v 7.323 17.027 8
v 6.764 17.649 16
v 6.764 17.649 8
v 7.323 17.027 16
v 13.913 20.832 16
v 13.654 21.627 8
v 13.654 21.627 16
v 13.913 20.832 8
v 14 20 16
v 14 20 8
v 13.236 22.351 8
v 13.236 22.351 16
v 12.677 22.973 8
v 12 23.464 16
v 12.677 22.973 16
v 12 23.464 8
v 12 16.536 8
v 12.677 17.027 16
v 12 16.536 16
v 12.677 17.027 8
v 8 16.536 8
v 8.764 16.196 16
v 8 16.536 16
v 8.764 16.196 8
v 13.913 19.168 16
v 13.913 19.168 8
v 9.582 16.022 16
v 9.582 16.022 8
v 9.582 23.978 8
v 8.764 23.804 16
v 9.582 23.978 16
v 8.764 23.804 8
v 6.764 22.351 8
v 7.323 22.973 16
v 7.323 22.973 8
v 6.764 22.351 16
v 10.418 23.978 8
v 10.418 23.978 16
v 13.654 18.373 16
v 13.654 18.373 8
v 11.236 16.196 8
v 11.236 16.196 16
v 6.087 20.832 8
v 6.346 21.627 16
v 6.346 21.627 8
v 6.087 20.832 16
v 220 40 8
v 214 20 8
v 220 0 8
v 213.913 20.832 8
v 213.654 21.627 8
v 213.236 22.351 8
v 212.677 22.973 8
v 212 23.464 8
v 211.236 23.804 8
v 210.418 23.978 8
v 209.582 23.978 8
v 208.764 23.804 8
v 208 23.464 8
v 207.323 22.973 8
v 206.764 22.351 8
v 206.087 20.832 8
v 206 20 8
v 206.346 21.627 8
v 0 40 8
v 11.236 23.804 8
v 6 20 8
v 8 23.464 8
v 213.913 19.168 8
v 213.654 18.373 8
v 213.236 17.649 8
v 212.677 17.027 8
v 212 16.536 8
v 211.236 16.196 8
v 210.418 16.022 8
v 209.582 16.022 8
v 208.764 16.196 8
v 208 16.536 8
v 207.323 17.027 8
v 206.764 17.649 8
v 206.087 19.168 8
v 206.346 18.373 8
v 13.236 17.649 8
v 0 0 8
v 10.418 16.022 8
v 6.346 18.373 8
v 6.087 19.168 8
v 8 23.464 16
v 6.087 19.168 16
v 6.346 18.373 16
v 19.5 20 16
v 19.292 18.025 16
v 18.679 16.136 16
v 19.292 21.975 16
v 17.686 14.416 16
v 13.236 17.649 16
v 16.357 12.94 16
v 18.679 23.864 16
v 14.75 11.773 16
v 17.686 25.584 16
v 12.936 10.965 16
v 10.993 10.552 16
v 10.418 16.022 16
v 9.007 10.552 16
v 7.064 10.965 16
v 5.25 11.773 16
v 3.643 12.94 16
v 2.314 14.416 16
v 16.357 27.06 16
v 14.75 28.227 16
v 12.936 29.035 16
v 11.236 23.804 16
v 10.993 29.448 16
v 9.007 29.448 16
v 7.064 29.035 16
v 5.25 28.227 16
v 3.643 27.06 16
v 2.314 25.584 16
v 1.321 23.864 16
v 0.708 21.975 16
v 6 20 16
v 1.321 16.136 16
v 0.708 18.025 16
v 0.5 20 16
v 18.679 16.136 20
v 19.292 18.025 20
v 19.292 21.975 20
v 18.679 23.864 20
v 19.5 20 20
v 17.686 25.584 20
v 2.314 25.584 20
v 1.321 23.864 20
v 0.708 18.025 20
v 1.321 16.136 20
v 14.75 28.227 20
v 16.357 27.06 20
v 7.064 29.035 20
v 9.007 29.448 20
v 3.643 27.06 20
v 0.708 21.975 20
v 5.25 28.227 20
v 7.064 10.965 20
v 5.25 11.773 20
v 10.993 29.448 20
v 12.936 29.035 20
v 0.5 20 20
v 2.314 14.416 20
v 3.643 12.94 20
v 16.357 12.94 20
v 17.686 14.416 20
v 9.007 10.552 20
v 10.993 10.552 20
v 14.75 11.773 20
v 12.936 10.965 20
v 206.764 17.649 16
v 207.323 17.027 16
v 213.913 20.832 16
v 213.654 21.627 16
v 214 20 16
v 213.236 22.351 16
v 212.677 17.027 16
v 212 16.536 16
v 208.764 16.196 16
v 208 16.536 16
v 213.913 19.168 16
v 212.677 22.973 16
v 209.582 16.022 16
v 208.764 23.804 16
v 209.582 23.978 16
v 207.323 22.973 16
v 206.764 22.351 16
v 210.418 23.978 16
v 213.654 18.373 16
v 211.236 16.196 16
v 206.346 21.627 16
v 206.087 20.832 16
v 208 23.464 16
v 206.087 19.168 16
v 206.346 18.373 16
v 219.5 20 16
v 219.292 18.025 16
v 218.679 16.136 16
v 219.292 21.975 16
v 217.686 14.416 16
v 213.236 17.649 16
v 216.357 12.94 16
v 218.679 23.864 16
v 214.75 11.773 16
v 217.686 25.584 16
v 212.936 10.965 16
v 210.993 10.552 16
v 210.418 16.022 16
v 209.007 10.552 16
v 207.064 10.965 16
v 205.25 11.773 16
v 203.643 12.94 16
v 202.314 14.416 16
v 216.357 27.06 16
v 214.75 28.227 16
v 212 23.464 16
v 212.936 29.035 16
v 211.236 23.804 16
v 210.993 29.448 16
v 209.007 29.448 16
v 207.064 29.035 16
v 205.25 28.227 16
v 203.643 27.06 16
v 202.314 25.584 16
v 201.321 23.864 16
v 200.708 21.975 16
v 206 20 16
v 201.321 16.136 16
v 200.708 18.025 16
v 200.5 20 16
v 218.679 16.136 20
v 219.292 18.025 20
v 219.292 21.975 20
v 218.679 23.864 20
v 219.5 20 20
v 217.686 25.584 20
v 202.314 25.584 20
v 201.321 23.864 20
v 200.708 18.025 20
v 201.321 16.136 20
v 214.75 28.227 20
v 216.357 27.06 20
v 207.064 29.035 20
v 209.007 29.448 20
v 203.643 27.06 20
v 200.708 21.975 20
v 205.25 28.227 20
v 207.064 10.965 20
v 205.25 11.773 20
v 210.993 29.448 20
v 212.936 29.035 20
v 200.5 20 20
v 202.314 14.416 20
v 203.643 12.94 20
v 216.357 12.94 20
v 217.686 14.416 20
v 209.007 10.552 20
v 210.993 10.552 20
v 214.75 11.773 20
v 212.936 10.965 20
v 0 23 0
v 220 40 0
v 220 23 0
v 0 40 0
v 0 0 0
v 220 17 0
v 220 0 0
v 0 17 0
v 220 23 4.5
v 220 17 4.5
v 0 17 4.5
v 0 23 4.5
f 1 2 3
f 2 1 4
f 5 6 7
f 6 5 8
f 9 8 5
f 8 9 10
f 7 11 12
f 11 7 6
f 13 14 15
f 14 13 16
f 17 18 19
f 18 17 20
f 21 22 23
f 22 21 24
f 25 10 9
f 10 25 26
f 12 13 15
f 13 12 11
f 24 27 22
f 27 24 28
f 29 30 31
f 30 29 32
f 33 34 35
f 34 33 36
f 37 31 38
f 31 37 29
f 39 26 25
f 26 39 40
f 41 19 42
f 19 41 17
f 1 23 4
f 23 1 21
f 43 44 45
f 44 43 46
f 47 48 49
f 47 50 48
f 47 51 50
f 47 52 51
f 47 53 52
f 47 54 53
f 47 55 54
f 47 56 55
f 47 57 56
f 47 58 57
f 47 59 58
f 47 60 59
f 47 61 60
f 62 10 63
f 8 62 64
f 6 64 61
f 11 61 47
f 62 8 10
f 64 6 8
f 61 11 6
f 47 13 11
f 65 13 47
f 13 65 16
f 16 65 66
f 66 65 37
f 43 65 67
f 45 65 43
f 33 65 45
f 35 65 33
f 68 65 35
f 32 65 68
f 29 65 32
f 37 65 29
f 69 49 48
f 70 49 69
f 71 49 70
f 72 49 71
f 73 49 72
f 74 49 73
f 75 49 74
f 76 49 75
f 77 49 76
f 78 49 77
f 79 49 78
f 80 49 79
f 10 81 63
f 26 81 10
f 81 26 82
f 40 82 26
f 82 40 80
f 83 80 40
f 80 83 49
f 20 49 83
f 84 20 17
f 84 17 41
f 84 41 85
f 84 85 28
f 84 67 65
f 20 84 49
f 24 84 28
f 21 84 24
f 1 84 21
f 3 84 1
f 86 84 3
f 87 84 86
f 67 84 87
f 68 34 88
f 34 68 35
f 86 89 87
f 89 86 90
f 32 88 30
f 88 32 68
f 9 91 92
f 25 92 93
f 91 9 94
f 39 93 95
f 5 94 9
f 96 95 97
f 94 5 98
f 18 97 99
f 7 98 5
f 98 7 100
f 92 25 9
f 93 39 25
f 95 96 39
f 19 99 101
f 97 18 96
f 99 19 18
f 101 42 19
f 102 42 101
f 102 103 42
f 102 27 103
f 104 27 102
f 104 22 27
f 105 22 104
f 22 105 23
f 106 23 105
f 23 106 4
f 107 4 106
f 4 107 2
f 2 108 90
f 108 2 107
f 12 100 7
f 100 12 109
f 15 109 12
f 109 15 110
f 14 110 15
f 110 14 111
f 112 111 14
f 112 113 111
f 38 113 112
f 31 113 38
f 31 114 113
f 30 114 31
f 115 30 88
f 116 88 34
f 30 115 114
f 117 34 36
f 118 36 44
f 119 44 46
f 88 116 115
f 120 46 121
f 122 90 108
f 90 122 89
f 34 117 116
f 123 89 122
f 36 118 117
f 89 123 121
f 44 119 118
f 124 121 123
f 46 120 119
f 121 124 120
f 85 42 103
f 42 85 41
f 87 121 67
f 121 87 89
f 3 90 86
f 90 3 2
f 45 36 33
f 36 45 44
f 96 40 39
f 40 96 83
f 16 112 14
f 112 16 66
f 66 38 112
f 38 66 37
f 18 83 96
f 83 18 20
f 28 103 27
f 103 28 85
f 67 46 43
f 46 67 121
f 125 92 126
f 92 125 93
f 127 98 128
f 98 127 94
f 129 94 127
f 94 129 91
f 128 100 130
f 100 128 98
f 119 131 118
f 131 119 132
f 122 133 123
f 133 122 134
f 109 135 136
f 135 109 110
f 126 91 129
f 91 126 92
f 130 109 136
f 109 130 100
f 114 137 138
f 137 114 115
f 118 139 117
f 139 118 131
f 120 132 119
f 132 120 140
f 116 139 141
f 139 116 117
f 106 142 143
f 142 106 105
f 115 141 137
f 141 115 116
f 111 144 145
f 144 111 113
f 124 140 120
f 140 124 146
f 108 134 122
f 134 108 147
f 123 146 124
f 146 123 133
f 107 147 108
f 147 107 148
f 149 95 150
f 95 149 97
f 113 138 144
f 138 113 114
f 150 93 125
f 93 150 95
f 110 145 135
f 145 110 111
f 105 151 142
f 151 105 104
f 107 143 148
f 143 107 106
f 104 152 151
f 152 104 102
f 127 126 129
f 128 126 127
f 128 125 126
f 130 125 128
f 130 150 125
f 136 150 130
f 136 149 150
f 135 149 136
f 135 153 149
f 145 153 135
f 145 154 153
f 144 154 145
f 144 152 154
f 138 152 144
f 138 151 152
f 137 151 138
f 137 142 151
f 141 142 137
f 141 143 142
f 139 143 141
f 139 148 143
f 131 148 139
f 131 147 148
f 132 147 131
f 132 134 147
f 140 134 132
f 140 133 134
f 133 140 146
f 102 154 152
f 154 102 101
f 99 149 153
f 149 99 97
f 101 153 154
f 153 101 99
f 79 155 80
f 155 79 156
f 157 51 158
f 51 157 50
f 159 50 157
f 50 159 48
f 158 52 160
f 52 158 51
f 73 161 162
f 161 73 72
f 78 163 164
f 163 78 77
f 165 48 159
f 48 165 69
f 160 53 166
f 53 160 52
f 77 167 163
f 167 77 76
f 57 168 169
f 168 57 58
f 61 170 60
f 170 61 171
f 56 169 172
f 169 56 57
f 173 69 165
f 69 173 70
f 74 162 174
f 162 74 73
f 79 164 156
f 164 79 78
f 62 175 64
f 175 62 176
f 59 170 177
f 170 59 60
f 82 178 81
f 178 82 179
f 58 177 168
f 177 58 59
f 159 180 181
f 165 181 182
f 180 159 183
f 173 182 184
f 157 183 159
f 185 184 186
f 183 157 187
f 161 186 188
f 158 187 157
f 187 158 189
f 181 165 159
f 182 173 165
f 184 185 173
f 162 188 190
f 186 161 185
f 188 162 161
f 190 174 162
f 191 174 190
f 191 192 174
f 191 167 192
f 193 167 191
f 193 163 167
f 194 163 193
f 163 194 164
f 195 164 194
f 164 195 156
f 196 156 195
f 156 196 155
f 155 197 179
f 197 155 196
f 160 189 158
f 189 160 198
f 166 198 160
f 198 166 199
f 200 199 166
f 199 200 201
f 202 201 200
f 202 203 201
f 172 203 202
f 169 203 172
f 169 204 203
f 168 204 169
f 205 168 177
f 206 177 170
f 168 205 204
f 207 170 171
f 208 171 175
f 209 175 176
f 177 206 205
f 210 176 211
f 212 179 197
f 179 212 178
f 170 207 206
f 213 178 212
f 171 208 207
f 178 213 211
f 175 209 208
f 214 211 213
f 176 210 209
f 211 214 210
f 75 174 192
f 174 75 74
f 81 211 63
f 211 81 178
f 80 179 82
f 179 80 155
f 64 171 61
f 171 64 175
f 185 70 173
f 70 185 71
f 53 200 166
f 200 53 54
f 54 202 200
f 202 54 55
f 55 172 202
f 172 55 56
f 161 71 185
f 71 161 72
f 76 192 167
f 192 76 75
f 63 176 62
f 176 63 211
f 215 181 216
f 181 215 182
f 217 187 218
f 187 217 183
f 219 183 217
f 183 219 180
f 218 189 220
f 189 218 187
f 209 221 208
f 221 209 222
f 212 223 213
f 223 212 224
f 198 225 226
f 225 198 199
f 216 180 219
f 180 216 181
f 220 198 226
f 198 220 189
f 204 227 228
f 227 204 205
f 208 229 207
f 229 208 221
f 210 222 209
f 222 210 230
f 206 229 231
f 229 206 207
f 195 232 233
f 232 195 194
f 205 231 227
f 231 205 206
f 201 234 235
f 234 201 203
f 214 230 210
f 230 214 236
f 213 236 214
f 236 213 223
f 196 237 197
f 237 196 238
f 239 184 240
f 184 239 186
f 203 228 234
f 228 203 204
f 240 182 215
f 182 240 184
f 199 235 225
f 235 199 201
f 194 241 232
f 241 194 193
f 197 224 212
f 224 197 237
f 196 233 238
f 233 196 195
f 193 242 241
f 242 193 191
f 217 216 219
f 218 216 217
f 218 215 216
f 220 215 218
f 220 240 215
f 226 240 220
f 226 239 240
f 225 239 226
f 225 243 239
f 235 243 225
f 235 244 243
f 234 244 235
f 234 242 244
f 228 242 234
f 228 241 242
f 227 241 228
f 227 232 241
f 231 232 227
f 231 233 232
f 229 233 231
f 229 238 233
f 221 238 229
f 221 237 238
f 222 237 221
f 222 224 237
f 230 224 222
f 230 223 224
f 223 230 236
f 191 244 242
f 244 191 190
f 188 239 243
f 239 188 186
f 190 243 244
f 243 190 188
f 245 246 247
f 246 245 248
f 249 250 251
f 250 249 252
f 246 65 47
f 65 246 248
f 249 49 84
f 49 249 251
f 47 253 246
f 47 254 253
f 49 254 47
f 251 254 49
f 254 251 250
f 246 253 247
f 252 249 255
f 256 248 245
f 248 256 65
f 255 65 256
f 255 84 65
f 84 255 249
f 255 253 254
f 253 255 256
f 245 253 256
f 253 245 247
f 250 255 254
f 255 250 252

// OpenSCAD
// file: parameters.scad
// Shared parameters for epdiy case design
// Single source of truth for all dimensions and design parameters

// E-ink screen dimensions (non-active part)
eink_width = 216;
eink_height = 156;
eink_thickness = 2; // Assumed thickness

// Active part dimensions
active_offset_x = 12;
active_offset_y = 12;
active_width = 202.8;
active_height = 139.4;

// Thicker ribbon dimensions
thick_ribbon_width = 182;
thick_ribbon_height = 20;
thick_ribbon_offset_x = 20; // from left of non-active part

// PCB connection ribbon dimensions  
pcb_ribbon_width = 17;
pcb_ribbon_height = 20;
pcb_ribbon_offset_x = 20; // from left of thicker ribbon

// PCB dimensions
pcb_width = 97;
pcb_height = 55;
pcb_thickness = 1.6; // Standard PCB thickness

// Mounting hole positions (relative to PCB origin)
mounting_holes = [
    [27.5, 12],
    [122.5, 12], 
    [27.5, 62],
    [122.5, 62]
];

// Design parameters for e-ink holder
arm_thickness = 6;
arm_length = 10;
groove_depth = 2;
groove_width = eink_thickness + 0.5; // Screen thickness + clearance
wall_height = 1.5;
bottom_arm_thickness = 4;

// Calculate case dimensions to accommodate screen size
case_width = eink_width + 2 * arm_thickness;  // 217 + 12 = 229mm
case_height = eink_height + bottom_arm_thickness; // 156 + 4 = 160mm

// Back structure parameters for e-ink holder
back_thickness = 2;
center_size = 60;
tendril_width = 10;

// PCB holder parameters
screw_hole_diameter = 2.4; // M2 screws (2mm + clearance)
screw_head_diameter = 4;   // M2 round head diameter  
screw_head_height = 1.4;   // M2 round head height (above surface)
standoff_height = 5;

// M2 nut parameters  
nut_diameter = 4.4;  // M2 hex nut width across flats (4mm + tolerance)
nut_thickness = 1.6; // M2 nut thickness

// Temporary assembly option (while waiting for screws)
use_temporary_pins = false;  // Set to false for screw holes, true for temporary pins
pin_diameter = 2.0;         // Pin diameter (fits through 2.2mm PCB holes)  
pin_height = 3;             // Pin height above standoff

// Calculate PCB holder dimensions to encompass all mounting holes
min_hole_x = min([for (hole = mounting_holes) hole[0]]) - 10;
max_hole_x = max([for (hole = mounting_holes) hole[0]]) + 10;
min_hole_y = min([for (hole = mounting_holes) hole[1]]) - 10;
max_hole_y = max([for (hole = mounting_holes) hole[1]]) + 10;

pcb_holder_width = max_hole_x - min_hole_x;
pcb_holder_height = max_hole_y - min_hole_y;

// Complete case parameters
case_thickness = 8; // Total thickness for back-to-back mounting
// main file
// Bridge Connector - spans between two complete cases bottom arms
// Provides pin-holders on top for mounting additional cases above
// Creates stackable/modular grid system

// Import parameters for consistency
include <parameters.scad>

// Bridge dimensions - spans between two cases
case_to_case_spacing = 240;  // 6 × 4cm spacing between case centers
bridge_length = 220;  // Long enough for 200mm pin spacing + clearance
bridge_width = 40;   // Reduced width to save material
bridge_thickness = 8; // Thickness for structural strength

// Bottom arm connection parameters (arms extend horizontally)
bottom_arm_slot_length = 62;   // Length to accommodate horizontal bottom arm
bottom_arm_slot_width = 6;     // Width of horizontal arm + clearance
bottom_arm_slot_depth = 4.5;   // Depth of groove to sit on horizontal arm (4mm + 0.5mm clearance)

// Pin-holder parameters (to match IKEA pin dimensions)
pin_head_diameter = 19;
pin_shaft_diameter = 8;
pin_total_height = 12;   // Total height of pin-holder
pin_shaft_height = 8;    // Height of shaft portion
pin_head_height = 4;     // Height of head portion

// Pin-holder positioning (must match complete case keyhole spacing)
pin_spacing = 200;  // 5 × 4cm spacing to match complete case keyholes
pin_1_x = bridge_length/2 - pin_spacing/2;
pin_2_x = bridge_length/2 + pin_spacing/2;
pin_y = bridge_width/2;

module bridge_connector() {
    difference() {
        union() {
            // Main bridge body
            cube([bridge_length, bridge_width, bridge_thickness]);

            // Pin-holders on top (IKEA pin compatible)
            for (pin_x = [pin_1_x, pin_2_x]) {
                translate([pin_x, pin_y, bridge_thickness]) {
                    // Pin shaft (narrow part)
                    cylinder(h = pin_shaft_height, d = pin_shaft_diameter, $fn = 30);

                    // Pin head (wide part)
                    translate([0, 0, pin_shaft_height])
                    cylinder(h = pin_head_height, d = pin_head_diameter, $fn = 30);
                }
            }

            // Reinforcement ribs for strength
            rib_thickness = 3;
            rib_height = 6;

            // Longitudinal ribs
            translate([0, (bridge_width - rib_thickness)/2, 0])
            cube([bridge_length, rib_thickness, rib_height]);

            // Cross ribs at pin positions
            for (pin_x = [pin_1_x, pin_2_x]) {
                translate([pin_x - rib_thickness/2, 0, 0])
                cube([rib_thickness, bridge_width, rib_height]);
            }
        }

        // Single long bottom groove for sliding onto horizontal arms
        translate([0, (bridge_width - bottom_arm_slot_width)/2, -1])
        cube([bridge_length, bottom_arm_slot_width, bottom_arm_slot_depth + 1]);
    }
}

// Render the bridge connector
bridge_connector();

// Optional: Show positioning guide
show_guide = false;
if (show_guide) {
    // Guide boxes showing where complete cases would be
    color("red", 0.3) {
        // Left case position
        translate([-60, -50, -case_thickness])
        cube([case_width, case_height, case_thickness]);

        // Right case position
        translate([bridge_length + 60 - case_width, -50, -case_thickness])
        cube([case_width, case_height, case_thickness]);
    }
}
